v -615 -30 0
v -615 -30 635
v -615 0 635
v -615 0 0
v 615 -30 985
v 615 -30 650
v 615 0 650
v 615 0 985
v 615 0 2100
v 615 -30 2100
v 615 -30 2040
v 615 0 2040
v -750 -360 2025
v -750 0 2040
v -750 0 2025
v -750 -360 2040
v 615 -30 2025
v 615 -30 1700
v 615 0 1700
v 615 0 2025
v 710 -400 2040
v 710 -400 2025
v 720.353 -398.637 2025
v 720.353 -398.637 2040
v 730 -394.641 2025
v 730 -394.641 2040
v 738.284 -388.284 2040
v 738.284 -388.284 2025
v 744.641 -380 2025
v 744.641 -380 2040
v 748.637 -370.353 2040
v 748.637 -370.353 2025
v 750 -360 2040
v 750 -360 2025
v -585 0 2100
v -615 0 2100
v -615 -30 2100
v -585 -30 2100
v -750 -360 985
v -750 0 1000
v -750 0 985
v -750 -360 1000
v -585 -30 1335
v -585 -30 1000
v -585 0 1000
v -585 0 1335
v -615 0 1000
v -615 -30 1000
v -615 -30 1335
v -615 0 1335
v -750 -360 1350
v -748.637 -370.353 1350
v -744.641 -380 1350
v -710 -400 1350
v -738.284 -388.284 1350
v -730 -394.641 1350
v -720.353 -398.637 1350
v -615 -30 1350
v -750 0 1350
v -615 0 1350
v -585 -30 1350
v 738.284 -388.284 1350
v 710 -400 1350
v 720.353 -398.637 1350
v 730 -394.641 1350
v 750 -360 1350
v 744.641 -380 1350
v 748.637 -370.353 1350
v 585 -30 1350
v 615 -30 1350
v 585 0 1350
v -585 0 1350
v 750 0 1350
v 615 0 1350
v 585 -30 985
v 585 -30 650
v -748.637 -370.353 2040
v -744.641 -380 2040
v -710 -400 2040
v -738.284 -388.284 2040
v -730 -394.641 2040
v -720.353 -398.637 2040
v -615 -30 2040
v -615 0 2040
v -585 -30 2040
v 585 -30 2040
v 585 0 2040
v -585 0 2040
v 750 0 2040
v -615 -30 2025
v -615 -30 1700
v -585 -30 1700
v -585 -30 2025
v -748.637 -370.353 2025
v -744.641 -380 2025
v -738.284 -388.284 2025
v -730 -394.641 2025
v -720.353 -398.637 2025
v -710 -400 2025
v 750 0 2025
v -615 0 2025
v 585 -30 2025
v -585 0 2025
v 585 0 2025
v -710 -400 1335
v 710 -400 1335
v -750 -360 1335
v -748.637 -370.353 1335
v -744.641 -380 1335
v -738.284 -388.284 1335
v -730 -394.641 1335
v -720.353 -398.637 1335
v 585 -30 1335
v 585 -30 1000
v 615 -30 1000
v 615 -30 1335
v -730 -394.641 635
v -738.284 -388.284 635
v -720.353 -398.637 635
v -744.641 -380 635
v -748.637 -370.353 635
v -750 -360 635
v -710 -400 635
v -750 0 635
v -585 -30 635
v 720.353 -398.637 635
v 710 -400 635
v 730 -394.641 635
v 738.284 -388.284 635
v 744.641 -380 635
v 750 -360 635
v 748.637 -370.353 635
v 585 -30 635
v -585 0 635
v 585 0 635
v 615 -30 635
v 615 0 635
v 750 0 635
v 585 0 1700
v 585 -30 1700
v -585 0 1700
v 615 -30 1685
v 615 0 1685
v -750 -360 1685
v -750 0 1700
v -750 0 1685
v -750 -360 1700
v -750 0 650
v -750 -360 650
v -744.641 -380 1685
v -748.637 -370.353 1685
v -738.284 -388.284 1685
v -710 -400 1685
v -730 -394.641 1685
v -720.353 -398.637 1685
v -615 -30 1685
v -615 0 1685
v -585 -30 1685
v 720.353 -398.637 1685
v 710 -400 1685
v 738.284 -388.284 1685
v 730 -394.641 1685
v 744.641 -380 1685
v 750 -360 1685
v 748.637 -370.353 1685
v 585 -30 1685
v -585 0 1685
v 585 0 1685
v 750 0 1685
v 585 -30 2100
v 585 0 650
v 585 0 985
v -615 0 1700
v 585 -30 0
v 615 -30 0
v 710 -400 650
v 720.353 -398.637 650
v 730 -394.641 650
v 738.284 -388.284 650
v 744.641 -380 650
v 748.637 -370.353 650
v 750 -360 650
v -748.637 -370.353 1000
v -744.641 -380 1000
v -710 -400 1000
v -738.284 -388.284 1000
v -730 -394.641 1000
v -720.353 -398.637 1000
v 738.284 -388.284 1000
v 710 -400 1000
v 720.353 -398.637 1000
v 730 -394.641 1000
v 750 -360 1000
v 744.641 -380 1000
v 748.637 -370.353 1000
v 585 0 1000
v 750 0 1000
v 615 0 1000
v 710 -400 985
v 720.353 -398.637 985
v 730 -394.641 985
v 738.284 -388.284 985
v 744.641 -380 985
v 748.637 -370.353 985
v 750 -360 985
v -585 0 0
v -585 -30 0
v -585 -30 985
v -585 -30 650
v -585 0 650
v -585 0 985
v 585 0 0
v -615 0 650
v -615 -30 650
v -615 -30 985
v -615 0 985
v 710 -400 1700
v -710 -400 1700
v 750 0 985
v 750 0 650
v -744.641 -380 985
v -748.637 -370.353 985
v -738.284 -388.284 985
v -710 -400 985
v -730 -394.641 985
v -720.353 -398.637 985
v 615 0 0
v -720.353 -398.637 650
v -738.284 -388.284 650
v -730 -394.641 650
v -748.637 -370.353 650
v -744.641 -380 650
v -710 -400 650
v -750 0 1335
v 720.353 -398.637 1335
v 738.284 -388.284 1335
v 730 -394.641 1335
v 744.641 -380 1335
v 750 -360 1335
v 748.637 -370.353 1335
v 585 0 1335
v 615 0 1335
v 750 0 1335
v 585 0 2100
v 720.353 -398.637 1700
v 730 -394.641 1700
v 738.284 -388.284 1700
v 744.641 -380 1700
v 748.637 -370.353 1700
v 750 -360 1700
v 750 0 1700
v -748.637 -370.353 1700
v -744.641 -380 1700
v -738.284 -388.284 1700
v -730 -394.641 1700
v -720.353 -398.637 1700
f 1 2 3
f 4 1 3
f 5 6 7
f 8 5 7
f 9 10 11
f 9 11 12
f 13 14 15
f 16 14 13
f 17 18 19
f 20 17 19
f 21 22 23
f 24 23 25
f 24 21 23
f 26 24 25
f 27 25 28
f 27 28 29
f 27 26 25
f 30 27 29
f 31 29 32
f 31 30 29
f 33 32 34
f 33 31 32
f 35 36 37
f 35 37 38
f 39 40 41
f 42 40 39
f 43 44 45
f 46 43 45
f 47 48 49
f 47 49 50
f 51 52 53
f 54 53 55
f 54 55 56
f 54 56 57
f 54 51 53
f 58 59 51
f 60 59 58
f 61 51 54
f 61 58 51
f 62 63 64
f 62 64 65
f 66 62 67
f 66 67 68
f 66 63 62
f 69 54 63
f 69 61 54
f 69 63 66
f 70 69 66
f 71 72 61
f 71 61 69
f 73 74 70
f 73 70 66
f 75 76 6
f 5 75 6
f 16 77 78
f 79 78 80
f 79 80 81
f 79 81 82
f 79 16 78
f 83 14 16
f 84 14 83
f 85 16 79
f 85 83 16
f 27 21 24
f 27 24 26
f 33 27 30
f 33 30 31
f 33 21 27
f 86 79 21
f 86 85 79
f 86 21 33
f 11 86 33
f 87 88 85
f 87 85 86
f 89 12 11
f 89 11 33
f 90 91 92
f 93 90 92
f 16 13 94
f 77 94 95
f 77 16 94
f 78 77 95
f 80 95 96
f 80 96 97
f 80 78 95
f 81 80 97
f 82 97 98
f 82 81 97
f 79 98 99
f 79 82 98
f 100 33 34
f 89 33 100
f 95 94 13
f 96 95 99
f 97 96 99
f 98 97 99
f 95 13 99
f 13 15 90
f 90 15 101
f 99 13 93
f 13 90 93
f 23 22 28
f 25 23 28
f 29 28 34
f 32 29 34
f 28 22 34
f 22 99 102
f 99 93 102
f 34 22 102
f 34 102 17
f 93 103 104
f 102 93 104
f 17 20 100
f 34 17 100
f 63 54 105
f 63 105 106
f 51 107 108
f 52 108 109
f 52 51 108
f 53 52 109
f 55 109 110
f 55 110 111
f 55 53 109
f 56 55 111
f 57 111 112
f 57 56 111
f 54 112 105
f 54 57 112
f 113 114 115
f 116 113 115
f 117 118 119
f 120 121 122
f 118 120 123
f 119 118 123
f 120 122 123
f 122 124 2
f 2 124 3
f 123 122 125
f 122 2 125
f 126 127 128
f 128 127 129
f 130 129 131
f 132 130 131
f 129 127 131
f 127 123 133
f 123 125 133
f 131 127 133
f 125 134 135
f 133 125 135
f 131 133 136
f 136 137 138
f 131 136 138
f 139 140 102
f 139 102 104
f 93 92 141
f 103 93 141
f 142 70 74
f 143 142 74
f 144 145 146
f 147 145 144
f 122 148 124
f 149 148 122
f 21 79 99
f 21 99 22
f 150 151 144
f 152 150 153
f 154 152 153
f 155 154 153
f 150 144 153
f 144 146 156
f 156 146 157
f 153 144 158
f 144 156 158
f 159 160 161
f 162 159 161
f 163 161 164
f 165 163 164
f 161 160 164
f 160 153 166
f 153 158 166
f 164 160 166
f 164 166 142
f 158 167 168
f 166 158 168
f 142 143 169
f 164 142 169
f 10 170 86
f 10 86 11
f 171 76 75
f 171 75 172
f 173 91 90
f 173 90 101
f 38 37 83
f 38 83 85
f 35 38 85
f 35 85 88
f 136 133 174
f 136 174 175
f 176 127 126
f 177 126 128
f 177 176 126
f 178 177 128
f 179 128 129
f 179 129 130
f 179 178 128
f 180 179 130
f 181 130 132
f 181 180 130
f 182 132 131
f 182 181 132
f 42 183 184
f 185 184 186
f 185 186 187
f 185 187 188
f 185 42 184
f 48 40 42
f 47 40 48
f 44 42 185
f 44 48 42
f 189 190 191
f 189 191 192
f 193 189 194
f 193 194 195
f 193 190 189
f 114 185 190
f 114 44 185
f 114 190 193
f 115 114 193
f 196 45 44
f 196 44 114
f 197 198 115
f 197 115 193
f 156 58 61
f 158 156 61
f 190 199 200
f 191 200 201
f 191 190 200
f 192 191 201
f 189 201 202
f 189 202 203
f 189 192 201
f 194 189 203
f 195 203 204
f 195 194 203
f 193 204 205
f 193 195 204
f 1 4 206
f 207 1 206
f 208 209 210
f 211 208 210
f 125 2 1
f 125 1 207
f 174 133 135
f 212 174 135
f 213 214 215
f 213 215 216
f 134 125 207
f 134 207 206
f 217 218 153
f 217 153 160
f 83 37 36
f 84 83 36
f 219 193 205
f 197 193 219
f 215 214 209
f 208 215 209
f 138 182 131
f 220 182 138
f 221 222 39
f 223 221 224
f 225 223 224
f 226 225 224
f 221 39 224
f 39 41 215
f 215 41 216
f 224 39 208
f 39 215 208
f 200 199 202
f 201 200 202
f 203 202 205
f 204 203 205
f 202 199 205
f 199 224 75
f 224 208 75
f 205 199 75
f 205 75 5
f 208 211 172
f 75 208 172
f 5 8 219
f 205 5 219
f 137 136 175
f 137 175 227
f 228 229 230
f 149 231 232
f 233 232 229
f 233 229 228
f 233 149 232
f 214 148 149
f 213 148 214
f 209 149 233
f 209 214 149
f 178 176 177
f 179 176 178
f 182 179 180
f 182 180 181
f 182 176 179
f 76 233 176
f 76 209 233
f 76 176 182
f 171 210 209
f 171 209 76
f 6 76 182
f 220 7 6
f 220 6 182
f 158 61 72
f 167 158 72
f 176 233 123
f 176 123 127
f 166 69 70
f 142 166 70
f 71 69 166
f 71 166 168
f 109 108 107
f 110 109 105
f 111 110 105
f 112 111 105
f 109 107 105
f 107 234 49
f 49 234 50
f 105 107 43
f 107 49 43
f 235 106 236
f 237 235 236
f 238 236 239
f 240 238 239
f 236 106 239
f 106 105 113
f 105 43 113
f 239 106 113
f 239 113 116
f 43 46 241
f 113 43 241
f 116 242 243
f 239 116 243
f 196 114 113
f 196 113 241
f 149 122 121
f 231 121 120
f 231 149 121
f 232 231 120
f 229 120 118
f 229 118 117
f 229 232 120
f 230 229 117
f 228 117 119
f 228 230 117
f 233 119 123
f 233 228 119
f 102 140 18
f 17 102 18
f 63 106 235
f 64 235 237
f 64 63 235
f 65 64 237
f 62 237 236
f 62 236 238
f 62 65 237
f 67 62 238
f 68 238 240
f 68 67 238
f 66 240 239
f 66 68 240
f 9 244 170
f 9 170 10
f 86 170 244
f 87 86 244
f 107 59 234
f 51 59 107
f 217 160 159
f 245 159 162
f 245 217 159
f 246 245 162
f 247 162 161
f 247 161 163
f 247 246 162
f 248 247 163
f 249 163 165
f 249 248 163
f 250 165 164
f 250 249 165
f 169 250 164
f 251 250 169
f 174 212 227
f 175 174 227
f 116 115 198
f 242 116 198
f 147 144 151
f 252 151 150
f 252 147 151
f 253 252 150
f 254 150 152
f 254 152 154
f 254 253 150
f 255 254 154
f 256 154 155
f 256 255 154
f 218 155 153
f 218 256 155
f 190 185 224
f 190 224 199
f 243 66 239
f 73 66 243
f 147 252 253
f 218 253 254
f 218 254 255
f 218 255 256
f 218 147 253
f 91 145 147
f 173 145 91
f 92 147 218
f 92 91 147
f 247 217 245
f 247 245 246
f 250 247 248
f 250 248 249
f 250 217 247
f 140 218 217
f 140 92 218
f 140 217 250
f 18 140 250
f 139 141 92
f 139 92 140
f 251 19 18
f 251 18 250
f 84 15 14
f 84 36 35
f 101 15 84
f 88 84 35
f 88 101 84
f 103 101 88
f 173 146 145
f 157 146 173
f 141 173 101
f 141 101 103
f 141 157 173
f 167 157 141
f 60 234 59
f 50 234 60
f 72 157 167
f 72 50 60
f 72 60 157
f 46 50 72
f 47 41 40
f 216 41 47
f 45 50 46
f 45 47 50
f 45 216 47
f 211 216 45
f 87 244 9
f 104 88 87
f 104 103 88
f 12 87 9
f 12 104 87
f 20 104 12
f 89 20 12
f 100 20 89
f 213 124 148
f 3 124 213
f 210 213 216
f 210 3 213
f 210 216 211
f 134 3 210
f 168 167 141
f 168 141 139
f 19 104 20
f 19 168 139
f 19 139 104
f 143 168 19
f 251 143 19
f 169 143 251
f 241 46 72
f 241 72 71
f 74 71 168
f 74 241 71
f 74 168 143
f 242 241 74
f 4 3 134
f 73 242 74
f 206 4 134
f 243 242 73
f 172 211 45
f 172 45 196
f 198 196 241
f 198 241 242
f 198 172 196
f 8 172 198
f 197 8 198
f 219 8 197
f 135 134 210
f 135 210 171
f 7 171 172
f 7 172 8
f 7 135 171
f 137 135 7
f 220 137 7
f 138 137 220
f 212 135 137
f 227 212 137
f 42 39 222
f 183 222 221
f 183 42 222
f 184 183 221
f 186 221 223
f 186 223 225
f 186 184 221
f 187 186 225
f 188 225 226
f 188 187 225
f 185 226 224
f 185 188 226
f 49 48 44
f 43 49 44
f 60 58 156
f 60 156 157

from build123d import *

# Parameters (mm, degrees)
F7_W      = 30
F7_H      = 30
F8_DEPTH  = 2100
F15_DEPTH = 15
F17_DEPTH = 15
F19_DEPTH = 15
F21_DEPTH = 15
F23_DEPTH = 15


with BuildPart() as f8:
    # F7 (on Top) → F8 (new body)
    with BuildSketch(Plane.XY):
        with Locations((-600, -15)):
            Rectangle(F7_W, F7_H)
    extrude(amount=F8_DEPTH)



with BuildPart() as f8b:
    # F7 (on Top) → F8, piece 2 (new body)
    with BuildSketch(Plane.XY):
        with Locations((600, -15)):
            Rectangle(F7_W, F7_H)
    extrude(amount=F8_DEPTH)


with BuildPart() as f8_1:
    add(f8.part)

    add(f8b.part)  # F15 merges F8b
    # F14 (on offset) → F15 (join)
    with BuildSketch(Plane.XY.offset(650)):
        with BuildLine():
            Line((585, 0), (0, 0))
            Line((0, 0), (-585, 0))
            Line((-585, 0), (-585, -30))
            Line((-585, -30), (-615, -30))
            Line((-615, -30), (-615, 0))
            Line((-615, 0), (-750, 0))
            Line((-750, 0), (-750, -360))
            ThreePointArc((-750, -360), (-738.2842712475, -388.2842712475), (-710, -400))
            Line((-710, -400), (0, -400))
            Line((0, -400), (710, -400))
            ThreePointArc((710, -400), (738.2842712475, -388.2842712475), (750, -360))
            Line((750, -360), (750, 0))
            Line((750, 0), (615, 0))
            Line((615, 0), (615, -30))
            Line((615, -30), (585, -30))
            Line((585, -30), (585, 0))
        make_face()
    extrude(amount=-F15_DEPTH)

    # F16 (on offset) → F17 (join)
    with BuildSketch(Plane.XY.offset(1000)):
        with BuildLine():
            Line((0, -400), (710, -400))
            ThreePointArc((710, -400), (738.2842712475, -388.2842712475), (750, -360))
            Line((750, -360), (750, 0))
            Line((750, 0), (615, 0))
            Line((615, 0), (615, -30))
            Line((615, -30), (585, -30))
            Line((585, -30), (585, 0))
            Line((585, 0), (0, 0))
            Line((0, 0), (-585, 0))
            Line((-585, 0), (-585, -30))
            Line((-585, -30), (-615, -30))
            Line((-615, -30), (-615, 0))
            Line((-615, 0), (-750, 0))
            Line((-750, 0), (-750, -360))
            ThreePointArc((-750, -360), (-738.2842712475, -388.2842712475), (-710, -400))
            Line((-710, -400), (0, -400))
        make_face()
    extrude(amount=-F17_DEPTH)

    # F18 (on offset) → F19 (join)
    with BuildSketch(Plane.XY.offset(1350)):
        with BuildLine():
            Line((0, -400), (710, -400))
            ThreePointArc((710, -400), (738.2842712475, -388.2842712475), (750, -360))
            Line((750, -360), (750, 0))
            Line((750, 0), (615, 0))
            Line((615, 0), (615, -30))
            Line((615, -30), (585, -30))
            Line((585, -30), (585, 0))
            Line((585, 0), (0, 0))
            Line((0, 0), (-585, 0))
            Line((-585, 0), (-585, -30))
            Line((-585, -30), (-615, -30))
            Line((-615, -30), (-615, 0))
            Line((-615, 0), (-750, 0))
            Line((-750, 0), (-750, -360))
            ThreePointArc((-750, -360), (-738.2842712475, -388.2842712475), (-710, -400))
            Line((-710, -400), (0, -400))
        make_face()
    extrude(amount=-F19_DEPTH)

    # F20 (on offset) → F21 (join)
    with BuildSketch(Plane.XY.offset(1700)):
        with BuildLine():
            Line((0, -400), (710, -400))
            ThreePointArc((710, -400), (738.2842712475, -388.2842712475), (750, -360))
            Line((750, -360), (750, 0))
            Line((750, 0), (615, 0))
            Line((615, 0), (615, -30))
            Line((615, -30), (585, -30))
            Line((585, -30), (585, 0))
            Line((585, 0), (0, 0))
            Line((0, 0), (-585, 0))
            Line((-585, 0), (-585, -30))
            Line((-585, -30), (-615, -30))
            Line((-615, -30), (-615, 0))
            Line((-615, 0), (-750, 0))
            Line((-750, 0), (-750, -360))
            ThreePointArc((-750, -360), (-738.2842712475, -388.2842712475), (-710, -400))
            Line((-710, -400), (0, -400))
        make_face()
    extrude(amount=-F21_DEPTH)

    # F22 (on offset) → F23 (join)
    with BuildSketch(Plane.XY.offset(2040)):
        with BuildLine():
            Line((0, -400), (710, -400))
            ThreePointArc((710, -400), (738.2842712475, -388.2842712475), (750, -360))
            Line((750, -360), (750, 0))
            Line((750, 0), (615, 0))
            Line((615, 0), (615, -30))
            Line((615, -30), (585, -30))
            Line((585, -30), (585, 0))
            Line((585, 0), (0, 0))
            Line((0, 0), (-585, 0))
            Line((-585, 0), (-585, -30))
            Line((-585, -30), (-615, -30))
            Line((-615, -30), (-615, 0))
            Line((-615, 0), (-750, 0))
            Line((-750, 0), (-750, -360))
            ThreePointArc((-750, -360), (-738.2842712475, -388.2842712475), (-710, -400))
            Line((-710, -400), (0, -400))
        make_face()
    extrude(amount=-F23_DEPTH)


solid = f8_1.part
